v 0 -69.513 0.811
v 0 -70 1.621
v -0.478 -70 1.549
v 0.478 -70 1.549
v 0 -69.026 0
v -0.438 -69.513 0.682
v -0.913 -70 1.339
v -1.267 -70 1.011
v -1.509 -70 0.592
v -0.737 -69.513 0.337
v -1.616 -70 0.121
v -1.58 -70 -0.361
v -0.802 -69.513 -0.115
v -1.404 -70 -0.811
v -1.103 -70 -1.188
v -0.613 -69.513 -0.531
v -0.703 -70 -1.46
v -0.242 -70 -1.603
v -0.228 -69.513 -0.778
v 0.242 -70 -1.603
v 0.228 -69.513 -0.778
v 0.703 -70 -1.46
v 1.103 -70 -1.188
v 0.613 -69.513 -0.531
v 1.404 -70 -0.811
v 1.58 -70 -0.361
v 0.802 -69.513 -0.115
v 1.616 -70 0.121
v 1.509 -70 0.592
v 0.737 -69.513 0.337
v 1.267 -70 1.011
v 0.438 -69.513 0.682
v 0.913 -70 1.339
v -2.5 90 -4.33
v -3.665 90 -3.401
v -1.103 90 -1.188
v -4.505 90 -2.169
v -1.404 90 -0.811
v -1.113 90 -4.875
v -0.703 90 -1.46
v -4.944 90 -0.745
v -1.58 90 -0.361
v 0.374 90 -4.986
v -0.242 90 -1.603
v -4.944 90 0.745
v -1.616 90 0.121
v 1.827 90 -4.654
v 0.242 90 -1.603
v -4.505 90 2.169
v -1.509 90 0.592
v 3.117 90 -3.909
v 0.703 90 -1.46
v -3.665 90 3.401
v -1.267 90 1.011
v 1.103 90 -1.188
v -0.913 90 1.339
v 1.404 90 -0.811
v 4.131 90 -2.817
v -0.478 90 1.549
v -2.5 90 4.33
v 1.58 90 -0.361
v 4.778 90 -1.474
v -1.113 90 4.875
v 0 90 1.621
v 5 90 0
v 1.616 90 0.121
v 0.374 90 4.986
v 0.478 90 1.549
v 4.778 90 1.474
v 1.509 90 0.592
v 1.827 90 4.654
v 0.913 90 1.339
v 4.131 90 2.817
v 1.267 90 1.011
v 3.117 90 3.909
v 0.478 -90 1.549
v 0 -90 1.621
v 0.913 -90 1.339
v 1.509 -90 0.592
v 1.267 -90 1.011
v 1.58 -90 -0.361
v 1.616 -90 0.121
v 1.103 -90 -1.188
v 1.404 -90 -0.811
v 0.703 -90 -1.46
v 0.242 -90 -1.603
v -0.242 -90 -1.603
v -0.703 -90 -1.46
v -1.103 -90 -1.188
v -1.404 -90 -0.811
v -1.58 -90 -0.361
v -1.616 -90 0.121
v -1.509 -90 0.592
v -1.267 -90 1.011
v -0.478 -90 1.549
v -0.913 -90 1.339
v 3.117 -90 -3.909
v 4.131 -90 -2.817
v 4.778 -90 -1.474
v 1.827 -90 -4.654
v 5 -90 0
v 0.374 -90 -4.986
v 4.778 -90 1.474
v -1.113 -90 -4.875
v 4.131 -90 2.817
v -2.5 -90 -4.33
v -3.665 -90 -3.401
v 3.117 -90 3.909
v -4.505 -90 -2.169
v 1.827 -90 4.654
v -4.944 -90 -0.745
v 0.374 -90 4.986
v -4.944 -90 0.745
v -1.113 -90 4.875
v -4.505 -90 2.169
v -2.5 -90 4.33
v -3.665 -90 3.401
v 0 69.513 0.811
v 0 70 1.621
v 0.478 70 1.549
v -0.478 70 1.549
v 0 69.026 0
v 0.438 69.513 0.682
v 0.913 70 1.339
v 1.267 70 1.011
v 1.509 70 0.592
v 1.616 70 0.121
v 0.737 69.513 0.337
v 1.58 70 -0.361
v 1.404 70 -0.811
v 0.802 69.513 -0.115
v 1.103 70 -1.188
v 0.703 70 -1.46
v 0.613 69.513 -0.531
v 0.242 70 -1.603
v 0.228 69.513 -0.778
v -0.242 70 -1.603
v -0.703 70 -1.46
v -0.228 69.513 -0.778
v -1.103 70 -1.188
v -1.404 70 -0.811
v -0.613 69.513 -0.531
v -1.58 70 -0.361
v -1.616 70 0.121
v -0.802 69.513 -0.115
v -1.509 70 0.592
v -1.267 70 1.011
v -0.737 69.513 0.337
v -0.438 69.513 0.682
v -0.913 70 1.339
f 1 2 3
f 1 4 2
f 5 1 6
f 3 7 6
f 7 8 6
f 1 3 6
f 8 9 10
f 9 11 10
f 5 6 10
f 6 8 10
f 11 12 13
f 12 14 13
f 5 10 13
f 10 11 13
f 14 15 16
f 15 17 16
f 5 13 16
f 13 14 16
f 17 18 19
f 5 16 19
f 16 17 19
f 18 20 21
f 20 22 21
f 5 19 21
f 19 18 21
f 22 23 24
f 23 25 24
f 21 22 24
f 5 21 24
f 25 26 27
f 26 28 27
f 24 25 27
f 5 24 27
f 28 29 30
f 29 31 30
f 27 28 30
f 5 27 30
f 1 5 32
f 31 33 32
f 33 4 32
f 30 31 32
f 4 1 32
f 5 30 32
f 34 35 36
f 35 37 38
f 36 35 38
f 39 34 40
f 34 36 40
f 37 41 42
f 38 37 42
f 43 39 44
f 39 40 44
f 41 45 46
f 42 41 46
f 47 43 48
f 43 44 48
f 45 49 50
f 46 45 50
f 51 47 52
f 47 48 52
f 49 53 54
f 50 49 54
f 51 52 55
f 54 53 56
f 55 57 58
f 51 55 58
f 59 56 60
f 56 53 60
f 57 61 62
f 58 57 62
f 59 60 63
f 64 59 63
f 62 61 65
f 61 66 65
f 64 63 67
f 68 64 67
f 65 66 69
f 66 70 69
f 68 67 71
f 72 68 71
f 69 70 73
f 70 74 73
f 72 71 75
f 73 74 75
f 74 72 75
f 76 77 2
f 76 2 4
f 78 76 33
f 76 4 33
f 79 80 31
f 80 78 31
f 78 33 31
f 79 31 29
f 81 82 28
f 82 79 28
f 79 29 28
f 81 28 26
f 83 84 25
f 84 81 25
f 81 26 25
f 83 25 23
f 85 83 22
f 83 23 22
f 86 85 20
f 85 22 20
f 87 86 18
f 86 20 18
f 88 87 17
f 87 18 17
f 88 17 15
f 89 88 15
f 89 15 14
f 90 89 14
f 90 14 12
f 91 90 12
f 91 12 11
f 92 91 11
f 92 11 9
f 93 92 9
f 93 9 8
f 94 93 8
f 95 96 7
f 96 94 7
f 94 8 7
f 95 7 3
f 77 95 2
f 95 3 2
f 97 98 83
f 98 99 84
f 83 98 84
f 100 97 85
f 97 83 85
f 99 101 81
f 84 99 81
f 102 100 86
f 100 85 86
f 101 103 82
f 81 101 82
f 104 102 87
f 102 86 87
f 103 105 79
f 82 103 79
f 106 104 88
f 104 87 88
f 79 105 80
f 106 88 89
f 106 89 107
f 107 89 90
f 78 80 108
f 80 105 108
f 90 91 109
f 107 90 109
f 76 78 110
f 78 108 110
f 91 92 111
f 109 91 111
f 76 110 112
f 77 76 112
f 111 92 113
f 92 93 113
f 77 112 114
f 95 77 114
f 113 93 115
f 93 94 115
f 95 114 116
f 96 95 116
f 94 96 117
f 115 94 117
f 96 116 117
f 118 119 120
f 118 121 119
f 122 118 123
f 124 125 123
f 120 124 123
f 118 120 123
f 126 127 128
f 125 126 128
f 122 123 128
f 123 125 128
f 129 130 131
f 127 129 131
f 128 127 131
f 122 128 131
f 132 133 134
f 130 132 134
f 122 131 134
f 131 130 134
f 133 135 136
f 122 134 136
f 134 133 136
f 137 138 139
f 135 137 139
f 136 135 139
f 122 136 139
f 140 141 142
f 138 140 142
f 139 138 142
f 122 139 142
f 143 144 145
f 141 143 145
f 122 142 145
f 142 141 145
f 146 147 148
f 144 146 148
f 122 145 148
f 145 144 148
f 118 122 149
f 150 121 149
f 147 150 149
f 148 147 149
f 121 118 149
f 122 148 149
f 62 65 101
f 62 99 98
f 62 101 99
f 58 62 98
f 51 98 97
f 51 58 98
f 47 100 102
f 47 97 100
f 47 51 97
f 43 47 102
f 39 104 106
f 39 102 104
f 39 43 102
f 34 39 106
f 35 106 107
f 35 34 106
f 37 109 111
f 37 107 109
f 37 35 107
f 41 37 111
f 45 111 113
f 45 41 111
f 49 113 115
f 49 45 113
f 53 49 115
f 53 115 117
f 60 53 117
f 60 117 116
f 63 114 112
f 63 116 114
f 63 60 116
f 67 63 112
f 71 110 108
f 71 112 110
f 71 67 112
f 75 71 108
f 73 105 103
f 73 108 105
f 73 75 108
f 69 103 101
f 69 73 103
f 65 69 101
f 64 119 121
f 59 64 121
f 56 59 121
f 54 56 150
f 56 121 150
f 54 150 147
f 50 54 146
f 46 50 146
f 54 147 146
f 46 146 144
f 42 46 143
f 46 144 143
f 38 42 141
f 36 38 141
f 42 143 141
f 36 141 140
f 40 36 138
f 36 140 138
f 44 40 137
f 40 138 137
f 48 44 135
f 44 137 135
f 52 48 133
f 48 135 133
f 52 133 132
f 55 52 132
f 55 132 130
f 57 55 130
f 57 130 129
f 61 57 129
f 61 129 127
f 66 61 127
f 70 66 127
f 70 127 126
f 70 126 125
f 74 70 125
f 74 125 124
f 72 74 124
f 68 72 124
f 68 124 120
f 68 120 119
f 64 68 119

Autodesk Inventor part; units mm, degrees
ref_plane "YZ Plane" through (0, 0, 0) normal (1, 0, 0) x (0, 1, 0)
ref_plane "XZ Plane" through (0, 0, 0) normal (0, 1, 0) x (-1, 0, 0)
ref_plane "XY Plane" through (0, 0, 0) normal (0, 0, 1) x (1, 0, 0)
sketch "Esquisse1" plane through (0, 0, 0) normal (0, 0, 1) x (1, 0, 0)
  line L0 (0, 0) -> (5, 0)
  line L1 (5, 0) -> (5, 90)
  line L2 (5, 90) -> (0, 90)
  line L3 (0, 90) -> (0, 0)
  dimension "d0" = 10
  dimension "d3" = 180
revolve "Révolution1" add sketch "Esquisse1" angle 360 about axis through (0, 90, 0) along (0, -1, 0)
sketch "Esquisse2" plane through (0, 90, 0) normal (0, 1, 0) x (1, 0, 0)
  circle A0 centre (0, 0) radius 5 projected
hole "Perçage1" at (0, 90, 0) direction (0, -1, 0) diameter 3.242 depth 20 tip angle 118 thread size "M4x0.7" class "6H" standard "ISO Metric profile"
mirror "Mise en miroir1" about plane through (0, 0, 0) normal (0, 1, 0)
properties part number "barre" material "Aluminium 6061"
